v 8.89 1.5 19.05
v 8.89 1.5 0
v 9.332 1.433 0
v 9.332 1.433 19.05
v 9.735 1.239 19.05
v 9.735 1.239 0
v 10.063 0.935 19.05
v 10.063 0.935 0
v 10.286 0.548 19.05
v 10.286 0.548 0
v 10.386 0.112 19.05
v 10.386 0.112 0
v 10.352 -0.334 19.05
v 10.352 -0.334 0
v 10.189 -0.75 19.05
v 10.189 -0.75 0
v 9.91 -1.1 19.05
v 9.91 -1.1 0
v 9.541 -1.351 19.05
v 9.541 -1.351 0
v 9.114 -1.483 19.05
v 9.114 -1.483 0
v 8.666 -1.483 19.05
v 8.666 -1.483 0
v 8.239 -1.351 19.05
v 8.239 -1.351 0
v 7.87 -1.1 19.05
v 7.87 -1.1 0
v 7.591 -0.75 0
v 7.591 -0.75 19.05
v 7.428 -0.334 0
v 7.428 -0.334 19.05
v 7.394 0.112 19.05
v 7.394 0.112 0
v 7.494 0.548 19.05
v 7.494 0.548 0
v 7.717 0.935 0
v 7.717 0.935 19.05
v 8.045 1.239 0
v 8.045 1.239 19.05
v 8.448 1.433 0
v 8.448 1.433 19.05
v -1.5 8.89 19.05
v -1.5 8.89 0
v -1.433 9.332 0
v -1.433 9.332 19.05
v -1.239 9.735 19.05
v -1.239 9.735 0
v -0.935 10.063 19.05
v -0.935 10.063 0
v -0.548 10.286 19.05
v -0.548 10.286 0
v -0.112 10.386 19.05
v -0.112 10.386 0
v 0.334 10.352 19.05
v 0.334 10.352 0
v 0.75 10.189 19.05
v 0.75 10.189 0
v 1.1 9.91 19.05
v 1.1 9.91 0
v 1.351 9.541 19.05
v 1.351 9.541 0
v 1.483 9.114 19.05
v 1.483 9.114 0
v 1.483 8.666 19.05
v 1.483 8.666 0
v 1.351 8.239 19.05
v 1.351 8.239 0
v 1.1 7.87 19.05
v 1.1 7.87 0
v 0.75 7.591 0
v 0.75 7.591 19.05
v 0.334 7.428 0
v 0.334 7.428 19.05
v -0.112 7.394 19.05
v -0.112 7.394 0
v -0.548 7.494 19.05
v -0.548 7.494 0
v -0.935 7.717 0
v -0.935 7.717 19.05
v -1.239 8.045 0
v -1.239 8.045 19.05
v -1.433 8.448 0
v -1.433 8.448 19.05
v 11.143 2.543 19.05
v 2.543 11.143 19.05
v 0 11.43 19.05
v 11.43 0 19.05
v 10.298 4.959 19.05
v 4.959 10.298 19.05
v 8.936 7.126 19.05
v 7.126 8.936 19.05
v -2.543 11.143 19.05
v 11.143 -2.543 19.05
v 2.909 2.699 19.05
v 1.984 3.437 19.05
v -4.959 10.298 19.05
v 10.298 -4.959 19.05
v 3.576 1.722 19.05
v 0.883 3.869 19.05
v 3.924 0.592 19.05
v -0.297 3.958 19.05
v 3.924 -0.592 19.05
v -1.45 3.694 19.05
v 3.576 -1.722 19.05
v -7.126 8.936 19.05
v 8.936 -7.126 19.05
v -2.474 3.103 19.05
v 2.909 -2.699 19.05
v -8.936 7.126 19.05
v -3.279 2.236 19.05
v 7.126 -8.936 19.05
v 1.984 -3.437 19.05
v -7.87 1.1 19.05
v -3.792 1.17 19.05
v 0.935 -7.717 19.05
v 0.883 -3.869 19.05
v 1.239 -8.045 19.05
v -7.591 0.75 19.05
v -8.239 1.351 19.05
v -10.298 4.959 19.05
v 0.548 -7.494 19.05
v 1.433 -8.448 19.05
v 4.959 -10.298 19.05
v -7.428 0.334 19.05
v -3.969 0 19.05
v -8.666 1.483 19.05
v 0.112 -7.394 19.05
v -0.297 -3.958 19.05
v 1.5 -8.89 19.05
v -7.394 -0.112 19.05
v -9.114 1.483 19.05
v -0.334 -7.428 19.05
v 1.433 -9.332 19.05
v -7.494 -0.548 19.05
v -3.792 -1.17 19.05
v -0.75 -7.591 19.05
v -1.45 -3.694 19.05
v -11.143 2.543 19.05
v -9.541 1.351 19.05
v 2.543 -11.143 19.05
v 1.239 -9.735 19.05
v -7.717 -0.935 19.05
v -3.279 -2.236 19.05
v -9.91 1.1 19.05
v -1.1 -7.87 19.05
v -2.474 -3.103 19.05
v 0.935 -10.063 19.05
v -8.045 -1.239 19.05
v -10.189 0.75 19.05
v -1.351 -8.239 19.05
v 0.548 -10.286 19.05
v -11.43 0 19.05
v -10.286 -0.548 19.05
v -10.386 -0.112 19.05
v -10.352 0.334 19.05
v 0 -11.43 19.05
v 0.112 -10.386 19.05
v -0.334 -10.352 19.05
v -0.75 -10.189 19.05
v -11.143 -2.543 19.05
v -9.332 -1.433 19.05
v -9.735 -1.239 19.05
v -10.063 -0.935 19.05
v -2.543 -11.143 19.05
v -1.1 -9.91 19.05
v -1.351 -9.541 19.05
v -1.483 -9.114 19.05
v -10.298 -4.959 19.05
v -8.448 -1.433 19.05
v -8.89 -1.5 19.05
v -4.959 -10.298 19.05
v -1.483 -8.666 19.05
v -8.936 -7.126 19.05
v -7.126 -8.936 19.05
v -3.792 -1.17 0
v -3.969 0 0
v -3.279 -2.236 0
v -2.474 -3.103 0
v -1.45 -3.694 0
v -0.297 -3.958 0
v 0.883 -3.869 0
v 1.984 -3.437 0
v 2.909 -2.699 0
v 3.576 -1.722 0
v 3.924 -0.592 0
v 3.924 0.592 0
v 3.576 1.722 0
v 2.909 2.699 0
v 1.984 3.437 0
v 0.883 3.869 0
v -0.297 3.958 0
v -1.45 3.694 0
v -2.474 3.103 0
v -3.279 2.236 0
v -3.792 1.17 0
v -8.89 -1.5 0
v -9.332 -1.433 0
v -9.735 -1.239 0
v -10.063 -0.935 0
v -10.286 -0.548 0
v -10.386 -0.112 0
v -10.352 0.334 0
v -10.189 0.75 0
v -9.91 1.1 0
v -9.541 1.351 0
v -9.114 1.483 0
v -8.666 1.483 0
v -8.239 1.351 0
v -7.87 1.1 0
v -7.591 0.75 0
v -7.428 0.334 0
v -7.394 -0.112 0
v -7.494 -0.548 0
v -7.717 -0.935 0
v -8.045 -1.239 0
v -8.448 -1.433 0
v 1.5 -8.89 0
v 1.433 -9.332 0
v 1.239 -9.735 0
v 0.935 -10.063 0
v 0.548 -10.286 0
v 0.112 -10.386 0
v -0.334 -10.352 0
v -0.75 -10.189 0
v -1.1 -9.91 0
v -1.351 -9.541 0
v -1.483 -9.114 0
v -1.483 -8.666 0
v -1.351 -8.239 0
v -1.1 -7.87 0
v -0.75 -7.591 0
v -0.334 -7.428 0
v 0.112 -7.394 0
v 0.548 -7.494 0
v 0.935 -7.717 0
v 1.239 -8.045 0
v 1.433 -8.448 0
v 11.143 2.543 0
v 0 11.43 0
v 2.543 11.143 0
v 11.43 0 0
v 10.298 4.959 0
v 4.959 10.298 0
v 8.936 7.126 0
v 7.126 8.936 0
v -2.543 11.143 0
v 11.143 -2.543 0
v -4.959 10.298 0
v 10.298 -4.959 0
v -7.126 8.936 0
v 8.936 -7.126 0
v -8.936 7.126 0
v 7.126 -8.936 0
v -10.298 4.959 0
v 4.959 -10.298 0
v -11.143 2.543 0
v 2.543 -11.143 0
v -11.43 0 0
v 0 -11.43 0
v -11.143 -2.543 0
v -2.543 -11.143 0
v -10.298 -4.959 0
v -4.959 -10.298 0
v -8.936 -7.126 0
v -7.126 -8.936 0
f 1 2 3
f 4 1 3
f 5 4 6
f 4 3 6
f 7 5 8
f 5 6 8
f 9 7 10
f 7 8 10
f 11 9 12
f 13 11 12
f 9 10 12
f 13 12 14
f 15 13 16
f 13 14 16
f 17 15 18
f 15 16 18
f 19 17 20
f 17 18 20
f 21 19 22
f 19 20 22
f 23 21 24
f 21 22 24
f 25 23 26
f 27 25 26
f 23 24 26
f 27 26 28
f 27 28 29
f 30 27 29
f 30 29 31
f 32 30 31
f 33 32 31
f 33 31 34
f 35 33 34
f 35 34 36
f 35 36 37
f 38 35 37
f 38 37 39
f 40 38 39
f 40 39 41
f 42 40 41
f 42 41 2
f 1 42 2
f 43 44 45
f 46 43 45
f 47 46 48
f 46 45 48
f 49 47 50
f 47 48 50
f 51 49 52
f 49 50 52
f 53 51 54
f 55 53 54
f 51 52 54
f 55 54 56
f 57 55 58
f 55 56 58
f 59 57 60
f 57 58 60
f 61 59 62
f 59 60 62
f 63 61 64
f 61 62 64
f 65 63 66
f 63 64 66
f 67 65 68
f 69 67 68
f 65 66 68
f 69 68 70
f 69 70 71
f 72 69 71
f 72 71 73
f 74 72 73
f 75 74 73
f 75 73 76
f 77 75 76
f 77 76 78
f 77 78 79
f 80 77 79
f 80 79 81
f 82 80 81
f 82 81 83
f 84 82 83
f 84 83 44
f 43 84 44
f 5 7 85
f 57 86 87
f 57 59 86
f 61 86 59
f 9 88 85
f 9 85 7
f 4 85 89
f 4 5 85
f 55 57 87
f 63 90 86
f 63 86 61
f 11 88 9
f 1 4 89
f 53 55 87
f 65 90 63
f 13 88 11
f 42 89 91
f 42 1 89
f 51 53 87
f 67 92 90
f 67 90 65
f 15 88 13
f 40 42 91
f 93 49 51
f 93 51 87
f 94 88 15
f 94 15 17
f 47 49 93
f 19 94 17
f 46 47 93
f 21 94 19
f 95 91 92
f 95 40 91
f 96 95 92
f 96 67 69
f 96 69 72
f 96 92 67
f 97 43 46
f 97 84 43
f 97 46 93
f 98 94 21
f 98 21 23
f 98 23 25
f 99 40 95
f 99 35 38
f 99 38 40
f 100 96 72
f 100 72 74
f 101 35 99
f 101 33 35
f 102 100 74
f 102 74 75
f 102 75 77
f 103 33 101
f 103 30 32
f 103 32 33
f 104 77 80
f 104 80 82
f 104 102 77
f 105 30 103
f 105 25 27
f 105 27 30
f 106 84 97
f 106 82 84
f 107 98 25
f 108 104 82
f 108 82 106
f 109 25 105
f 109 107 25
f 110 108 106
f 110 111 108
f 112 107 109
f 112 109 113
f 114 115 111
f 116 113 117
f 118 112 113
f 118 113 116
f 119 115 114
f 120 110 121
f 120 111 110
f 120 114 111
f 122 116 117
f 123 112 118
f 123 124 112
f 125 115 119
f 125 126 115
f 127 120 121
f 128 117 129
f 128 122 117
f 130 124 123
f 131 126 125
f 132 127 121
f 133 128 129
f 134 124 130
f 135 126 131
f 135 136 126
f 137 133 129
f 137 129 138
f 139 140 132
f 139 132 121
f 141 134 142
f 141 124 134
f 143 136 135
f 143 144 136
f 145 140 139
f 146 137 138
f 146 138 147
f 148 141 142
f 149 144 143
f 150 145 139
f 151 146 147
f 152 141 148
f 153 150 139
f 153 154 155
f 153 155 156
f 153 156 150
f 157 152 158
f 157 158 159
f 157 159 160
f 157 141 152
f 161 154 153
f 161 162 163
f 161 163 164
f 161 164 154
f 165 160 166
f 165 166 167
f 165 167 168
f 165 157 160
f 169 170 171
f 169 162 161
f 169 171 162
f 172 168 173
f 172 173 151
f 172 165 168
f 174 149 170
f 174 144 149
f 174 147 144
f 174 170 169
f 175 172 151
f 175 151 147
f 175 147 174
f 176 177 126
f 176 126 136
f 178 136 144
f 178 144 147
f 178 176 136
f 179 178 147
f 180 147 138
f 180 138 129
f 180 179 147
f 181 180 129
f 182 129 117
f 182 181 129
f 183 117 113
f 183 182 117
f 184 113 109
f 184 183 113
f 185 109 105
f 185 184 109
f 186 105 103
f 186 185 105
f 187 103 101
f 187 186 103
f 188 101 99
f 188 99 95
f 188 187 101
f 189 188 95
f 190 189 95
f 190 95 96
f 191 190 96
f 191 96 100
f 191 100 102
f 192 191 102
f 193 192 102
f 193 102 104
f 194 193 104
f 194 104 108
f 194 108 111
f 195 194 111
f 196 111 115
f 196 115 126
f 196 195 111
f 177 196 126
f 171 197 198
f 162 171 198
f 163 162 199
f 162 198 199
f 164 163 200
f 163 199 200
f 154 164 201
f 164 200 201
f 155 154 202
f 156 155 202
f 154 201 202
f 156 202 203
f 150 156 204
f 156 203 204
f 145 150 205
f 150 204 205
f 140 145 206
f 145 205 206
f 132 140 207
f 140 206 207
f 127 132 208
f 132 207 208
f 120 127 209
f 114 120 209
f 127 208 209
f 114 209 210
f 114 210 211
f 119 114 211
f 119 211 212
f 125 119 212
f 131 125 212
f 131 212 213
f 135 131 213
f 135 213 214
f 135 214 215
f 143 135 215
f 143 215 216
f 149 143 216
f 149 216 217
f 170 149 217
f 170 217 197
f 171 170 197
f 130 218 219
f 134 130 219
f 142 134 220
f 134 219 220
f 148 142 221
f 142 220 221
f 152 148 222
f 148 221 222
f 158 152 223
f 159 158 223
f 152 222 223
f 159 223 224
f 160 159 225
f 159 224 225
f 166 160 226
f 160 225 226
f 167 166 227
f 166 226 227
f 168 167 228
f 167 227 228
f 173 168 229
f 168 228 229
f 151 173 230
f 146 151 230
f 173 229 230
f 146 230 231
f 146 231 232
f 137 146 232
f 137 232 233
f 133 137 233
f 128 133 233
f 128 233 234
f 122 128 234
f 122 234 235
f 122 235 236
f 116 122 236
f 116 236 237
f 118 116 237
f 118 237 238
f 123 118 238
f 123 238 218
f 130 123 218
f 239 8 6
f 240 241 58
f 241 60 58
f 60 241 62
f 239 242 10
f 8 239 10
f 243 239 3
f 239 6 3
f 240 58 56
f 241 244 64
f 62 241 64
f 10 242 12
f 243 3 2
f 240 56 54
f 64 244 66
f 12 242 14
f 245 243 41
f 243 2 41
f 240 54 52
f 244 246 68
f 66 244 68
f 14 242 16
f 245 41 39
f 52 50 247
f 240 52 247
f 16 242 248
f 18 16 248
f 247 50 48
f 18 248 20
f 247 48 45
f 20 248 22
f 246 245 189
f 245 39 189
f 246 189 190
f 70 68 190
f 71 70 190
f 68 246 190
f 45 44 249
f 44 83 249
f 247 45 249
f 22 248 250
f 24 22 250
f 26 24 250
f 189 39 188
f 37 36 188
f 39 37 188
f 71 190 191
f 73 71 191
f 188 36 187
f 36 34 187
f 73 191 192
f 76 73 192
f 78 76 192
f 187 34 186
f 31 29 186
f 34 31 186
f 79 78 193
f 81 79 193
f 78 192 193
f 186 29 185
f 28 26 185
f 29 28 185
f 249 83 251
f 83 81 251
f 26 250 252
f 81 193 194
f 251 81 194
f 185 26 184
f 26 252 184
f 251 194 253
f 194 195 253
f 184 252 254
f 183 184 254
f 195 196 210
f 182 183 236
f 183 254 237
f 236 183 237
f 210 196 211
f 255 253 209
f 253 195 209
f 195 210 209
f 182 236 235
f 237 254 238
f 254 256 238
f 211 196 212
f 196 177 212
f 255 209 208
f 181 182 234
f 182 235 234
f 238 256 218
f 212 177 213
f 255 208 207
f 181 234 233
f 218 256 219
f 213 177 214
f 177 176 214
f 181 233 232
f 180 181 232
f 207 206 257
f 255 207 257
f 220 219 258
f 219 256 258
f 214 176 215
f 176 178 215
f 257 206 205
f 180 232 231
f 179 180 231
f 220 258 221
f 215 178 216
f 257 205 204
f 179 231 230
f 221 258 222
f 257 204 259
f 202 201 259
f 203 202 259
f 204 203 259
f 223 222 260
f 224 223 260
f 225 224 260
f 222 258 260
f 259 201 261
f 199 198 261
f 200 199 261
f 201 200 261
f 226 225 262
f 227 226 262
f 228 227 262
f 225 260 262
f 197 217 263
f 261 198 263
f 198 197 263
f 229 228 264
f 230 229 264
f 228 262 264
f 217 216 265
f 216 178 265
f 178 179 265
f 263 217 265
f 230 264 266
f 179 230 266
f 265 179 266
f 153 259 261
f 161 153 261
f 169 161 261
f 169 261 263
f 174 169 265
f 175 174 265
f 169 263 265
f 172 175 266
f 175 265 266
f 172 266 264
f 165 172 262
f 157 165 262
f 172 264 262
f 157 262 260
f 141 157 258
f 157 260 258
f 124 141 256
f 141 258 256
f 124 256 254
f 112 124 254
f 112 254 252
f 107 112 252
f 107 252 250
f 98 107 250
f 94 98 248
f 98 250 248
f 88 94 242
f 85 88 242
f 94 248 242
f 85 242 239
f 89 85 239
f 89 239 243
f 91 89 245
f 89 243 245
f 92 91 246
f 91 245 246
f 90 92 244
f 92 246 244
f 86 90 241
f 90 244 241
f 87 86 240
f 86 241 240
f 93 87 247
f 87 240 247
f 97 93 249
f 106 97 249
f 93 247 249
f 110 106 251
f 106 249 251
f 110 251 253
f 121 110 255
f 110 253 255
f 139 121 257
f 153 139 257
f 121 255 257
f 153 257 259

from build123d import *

# Parameters (mm, degrees)
SKETCH1_R             = 11.43
SKETCH1_R_2           = 3.96875
BOSS_EXTRUDE1_DEPTH   = 19.05
F_3_0MM_DOWEL_HOLE1_D = 3
CIRPATTERN1_COUNT     = 4


with BuildPart() as part:
    # Sketch1 → Boss-Extrude1 (new body)
    with BuildSketch(Plane.XY):
        with Locations(Location((0, 0, 0), (0, 0, 180))):
            Circle(SKETCH1_R)
        with Locations(Location((0, 0, 0), (0, 0, 180))):
            Circle(SKETCH1_R_2, mode=Mode.SUBTRACT)
    extrude(amount=BOSS_EXTRUDE1_DEPTH)

    # Ø3.0mm Dowel Hole1 (through all)
    with Locations(Plane.XY.offset(19.05)):
        with Locations((0, 8.89)):
            f_3_0mm_dowel_hole1 = Hole(F_3_0MM_DOWEL_HOLE1_D / 2)

    # CirPattern1: Ø3.0mm Dowel Hole1 ×4 about axis
    cirpattern1_axis = Axis((0, 0, 0), (0, 0, 1))
    for i in range(1, CIRPATTERN1_COUNT):
        add(f_3_0mm_dowel_hole1.rotate(cirpattern1_axis, i * 360 / CIRPATTERN1_COUNT), mode=Mode.SUBTRACT)


solid = part.part
